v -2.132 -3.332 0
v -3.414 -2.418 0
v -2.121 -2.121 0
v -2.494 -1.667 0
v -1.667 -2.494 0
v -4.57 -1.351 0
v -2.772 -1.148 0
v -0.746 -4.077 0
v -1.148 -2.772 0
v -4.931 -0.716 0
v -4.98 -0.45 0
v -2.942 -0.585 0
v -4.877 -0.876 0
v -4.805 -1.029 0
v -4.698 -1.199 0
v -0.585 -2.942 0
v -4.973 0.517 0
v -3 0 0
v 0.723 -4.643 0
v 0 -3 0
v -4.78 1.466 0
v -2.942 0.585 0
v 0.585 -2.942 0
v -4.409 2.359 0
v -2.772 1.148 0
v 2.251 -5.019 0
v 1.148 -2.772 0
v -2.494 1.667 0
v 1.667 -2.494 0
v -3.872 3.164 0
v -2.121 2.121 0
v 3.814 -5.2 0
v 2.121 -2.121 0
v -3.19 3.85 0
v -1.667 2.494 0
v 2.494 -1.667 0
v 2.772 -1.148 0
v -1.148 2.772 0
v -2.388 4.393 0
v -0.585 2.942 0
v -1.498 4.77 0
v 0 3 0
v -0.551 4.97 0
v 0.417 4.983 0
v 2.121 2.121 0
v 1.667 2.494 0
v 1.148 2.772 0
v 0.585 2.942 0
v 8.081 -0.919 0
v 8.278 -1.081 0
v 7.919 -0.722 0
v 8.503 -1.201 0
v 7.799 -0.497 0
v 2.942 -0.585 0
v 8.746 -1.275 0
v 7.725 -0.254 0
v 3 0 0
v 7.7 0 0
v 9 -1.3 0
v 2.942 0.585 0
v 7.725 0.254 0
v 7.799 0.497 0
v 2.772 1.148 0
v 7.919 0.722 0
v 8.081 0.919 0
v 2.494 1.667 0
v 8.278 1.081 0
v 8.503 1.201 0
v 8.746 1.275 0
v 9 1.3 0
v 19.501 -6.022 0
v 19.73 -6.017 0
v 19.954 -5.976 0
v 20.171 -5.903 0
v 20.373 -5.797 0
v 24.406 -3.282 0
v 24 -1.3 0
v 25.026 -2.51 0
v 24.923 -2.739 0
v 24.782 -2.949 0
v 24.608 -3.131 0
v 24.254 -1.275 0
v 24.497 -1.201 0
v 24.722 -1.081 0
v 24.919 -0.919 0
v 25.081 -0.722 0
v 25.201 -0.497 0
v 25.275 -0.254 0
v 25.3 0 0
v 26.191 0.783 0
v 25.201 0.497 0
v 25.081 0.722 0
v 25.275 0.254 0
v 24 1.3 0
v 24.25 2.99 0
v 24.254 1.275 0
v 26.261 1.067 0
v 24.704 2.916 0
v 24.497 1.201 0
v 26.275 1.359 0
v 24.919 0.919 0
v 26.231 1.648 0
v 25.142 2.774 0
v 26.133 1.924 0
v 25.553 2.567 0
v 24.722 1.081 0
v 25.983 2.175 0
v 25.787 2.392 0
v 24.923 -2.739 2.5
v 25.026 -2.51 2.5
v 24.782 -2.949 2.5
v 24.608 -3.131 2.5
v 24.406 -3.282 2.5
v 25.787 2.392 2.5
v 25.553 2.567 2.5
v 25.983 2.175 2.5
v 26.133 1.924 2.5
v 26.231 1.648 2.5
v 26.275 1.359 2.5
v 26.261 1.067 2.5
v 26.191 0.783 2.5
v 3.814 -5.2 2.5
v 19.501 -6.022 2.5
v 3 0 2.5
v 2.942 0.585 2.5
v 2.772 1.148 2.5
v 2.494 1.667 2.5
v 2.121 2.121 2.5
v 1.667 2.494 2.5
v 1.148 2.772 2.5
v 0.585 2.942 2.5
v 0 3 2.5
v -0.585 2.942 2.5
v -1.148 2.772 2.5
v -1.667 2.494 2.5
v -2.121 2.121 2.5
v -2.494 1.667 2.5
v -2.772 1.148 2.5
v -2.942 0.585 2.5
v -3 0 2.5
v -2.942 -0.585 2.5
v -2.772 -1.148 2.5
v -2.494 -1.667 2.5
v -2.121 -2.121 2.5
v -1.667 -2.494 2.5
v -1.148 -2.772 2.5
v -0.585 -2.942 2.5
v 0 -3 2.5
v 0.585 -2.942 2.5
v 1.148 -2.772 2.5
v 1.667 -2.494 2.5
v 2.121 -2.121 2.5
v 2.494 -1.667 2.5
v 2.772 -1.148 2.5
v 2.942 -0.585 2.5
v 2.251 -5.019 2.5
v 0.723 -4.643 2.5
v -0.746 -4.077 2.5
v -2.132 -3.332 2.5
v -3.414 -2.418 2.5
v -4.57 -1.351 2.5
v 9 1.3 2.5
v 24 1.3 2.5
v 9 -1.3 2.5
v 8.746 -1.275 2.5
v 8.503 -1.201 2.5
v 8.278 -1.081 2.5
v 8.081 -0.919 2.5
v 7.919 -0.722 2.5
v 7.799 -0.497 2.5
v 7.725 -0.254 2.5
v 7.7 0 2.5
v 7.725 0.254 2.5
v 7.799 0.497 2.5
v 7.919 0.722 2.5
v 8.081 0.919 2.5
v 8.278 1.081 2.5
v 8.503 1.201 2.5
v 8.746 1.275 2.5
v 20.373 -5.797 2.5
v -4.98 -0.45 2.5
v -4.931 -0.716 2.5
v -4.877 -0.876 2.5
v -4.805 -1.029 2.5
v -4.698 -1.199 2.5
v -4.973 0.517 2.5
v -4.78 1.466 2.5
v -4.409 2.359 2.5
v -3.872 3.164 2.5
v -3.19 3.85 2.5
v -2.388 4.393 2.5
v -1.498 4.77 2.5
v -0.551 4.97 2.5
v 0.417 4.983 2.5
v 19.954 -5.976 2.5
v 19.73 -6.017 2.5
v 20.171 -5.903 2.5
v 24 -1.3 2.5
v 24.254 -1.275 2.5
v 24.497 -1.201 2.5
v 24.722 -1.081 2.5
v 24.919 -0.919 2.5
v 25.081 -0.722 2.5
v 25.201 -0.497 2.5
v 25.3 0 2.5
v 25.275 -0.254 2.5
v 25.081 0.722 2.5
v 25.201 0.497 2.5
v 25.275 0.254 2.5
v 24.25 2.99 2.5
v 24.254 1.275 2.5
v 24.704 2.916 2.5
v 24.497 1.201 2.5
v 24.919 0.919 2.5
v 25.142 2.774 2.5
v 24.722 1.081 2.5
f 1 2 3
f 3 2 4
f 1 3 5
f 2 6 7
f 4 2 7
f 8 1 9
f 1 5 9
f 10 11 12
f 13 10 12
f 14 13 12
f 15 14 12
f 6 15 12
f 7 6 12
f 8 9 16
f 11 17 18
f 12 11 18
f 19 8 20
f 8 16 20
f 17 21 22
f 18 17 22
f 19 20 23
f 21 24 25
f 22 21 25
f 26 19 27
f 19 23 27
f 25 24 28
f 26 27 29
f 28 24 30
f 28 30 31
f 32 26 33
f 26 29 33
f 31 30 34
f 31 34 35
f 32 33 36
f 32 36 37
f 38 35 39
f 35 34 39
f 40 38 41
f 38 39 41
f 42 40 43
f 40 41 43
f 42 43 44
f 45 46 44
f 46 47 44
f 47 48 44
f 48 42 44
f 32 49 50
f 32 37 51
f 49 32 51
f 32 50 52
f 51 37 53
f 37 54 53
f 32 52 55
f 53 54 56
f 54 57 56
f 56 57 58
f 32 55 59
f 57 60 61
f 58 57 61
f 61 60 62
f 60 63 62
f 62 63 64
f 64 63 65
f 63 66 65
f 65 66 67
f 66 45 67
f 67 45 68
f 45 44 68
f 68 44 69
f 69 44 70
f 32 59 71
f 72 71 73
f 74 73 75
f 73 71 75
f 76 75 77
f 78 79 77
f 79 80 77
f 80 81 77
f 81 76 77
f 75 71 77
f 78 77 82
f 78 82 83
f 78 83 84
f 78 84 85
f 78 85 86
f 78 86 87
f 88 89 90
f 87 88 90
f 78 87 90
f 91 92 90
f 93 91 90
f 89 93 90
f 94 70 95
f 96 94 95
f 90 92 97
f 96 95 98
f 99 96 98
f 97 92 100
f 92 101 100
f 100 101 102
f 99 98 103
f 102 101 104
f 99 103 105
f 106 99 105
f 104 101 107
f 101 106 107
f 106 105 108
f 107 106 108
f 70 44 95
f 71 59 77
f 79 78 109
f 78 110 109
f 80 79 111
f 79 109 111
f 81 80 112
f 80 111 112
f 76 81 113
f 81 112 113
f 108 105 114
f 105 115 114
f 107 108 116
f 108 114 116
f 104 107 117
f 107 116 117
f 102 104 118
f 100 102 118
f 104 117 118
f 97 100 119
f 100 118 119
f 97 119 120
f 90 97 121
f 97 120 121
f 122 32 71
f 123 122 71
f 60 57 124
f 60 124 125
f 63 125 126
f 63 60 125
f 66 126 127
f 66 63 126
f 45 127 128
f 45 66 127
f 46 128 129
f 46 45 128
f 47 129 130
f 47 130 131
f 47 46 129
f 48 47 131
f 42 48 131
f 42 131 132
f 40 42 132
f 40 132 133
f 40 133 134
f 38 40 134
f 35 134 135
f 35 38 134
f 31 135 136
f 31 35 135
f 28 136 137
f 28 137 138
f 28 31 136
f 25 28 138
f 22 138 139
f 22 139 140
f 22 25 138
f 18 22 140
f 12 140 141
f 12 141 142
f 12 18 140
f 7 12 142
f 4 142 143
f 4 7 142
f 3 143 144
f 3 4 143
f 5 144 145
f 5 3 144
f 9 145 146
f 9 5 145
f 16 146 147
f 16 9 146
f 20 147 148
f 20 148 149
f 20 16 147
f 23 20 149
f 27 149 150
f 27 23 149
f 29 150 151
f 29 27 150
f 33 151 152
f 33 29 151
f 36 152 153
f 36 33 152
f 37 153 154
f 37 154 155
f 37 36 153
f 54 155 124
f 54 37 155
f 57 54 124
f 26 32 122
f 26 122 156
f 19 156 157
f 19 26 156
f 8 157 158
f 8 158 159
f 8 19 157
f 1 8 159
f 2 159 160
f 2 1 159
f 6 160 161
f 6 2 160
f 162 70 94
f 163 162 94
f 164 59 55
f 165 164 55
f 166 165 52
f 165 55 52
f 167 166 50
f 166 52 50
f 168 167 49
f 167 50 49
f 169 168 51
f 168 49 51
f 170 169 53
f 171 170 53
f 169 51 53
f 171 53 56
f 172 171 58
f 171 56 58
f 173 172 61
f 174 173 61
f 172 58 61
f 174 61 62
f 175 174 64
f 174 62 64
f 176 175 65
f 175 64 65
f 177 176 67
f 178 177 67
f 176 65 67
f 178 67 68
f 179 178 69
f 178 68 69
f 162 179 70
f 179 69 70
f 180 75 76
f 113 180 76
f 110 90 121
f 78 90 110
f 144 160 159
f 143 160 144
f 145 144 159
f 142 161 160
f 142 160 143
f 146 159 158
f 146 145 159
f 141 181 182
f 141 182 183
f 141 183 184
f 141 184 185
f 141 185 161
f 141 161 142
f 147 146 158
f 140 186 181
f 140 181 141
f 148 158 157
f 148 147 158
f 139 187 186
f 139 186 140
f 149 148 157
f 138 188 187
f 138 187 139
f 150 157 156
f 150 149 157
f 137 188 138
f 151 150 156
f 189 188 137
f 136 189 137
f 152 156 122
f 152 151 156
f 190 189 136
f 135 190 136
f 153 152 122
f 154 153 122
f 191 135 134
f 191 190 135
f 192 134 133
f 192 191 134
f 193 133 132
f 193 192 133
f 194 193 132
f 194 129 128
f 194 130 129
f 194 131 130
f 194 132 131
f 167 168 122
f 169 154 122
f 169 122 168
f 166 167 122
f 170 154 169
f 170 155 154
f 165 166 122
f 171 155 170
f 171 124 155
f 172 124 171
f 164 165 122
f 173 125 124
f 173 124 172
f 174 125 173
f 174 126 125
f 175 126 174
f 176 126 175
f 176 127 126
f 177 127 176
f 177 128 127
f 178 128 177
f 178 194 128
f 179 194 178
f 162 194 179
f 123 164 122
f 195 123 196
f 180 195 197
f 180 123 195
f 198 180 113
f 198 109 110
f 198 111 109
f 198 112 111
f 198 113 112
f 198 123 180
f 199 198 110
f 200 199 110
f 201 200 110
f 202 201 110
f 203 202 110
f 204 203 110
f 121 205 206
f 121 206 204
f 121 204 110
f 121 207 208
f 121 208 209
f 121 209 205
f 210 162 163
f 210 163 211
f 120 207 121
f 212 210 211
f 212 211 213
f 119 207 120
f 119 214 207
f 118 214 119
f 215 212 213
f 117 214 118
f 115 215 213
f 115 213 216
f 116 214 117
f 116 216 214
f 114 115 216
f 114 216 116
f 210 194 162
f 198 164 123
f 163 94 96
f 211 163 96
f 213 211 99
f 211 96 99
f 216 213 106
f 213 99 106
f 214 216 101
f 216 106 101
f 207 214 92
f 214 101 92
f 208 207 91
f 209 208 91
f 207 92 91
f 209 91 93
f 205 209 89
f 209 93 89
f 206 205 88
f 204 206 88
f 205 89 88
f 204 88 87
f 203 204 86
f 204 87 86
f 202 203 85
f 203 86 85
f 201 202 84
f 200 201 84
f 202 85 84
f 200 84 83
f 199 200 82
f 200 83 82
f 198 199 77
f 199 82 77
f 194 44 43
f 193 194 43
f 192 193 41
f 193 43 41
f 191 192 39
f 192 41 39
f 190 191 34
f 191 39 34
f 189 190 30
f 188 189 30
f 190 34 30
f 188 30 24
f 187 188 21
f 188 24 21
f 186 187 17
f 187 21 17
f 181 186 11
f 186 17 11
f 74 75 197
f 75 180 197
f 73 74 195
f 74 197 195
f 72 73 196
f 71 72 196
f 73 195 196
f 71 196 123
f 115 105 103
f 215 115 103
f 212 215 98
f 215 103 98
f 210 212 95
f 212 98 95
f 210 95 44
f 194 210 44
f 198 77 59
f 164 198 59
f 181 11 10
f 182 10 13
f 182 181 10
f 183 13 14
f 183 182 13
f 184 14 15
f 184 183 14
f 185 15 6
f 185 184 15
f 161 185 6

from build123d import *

# Parameters (mm, degrees)
SKETCH_1_R          = 3
EXTRUDE_1_DEPTH     = 2.5
CUT_EXTRUDE_START   = -2.5
CUT_EXTRUDE_2_DEPTH = 2.5
CUT_EXTRUDE_START_2 = -20
CUT_EXTRUDE_3_DEPTH = 20
FILLET_2_R          = 1.5


with BuildPart() as part:
    # 草图1 → 凸台-拉伸1 (new body)
    with BuildSketch(Plane.XY):
        with BuildLine():
            ThreePointArc((0.416666667, 4.982608643), (-4.995650269, 0.20851473), (0, -5))
            Line((0, -5), (19.972590695, -6.046719125))
            Line((19.972590695, -6.046719125), (25.587337922, -2.545654792))
            ThreePointArc((25.587337922, -2.545654792), (26.916096314, 0.704544029), (24.25, 2.989565186))
            Line((24.25, 2.989565186), (0.416666667, 4.982608643))
        make_face()
        Circle(SKETCH_1_R, mode=Mode.SUBTRACT)
        with BuildLine():
            ThreePointArc((9, -1.3), (7.7, 0), (9, 1.3))
            Line((9, 1.3), (24, 1.3))
            ThreePointArc((24, 1.3), (25.3, 0), (24, -1.3))
            Line((24, -1.3), (9, -1.3))
        make_face(mode=Mode.SUBTRACT)
    extrude(amount=EXTRUDE_1_DEPTH)

    # 草图2 → 切除-拉伸2 (cut)
    with BuildSketch(Plane.XY.offset(2.5).offset(CUT_EXTRUDE_START)):
        with BuildLine():
            Line((24.851438624, -3.004523319), (25.587337922, -2.545654792))
            ThreePointArc((25.587337922, -2.545654792), (26.931709032, -0.636460643), (26.5, 1.658312395))
            Line((26.5, 1.658312395), (24.851438624, -3.004523319))
        make_face()
    extrude(amount=CUT_EXTRUDE_2_DEPTH, mode=Mode.SUBTRACT)

    # 草图3 → 切除-拉伸3 (cut)
    with BuildSketch(Plane.XY.offset(2.5).offset(CUT_EXTRUDE_START_2)):
        with BuildLine():
            ThreePointArc((-4.900680589, -0.991629852), (-3.165584523, -3.87028095), (0, -5))
            Line((0, -5), (3.814269781, -5.199897409))
            ThreePointArc((3.814269781, -5.199897409), (-0.9669941, -3.973392585), (-4.900680589, -0.991629852))
        make_face()
    extrude(amount=CUT_EXTRUDE_3_DEPTH, mode=Mode.SUBTRACT)

    # 圆角2
    fillet_2_edges = [part.edges().sort_by_distance(p)[0] for p in [
        (19.972590695, -6.046719125, 1.25),
        (26.5, 1.658312395, 1.25),
        (24.851438624, -3.004523319, 1.25),
        (-4.900680589, -0.991629852, 1.25),
    ]]
    fillet(fillet_2_edges, radius=FILLET_2_R)


solid = part.part
